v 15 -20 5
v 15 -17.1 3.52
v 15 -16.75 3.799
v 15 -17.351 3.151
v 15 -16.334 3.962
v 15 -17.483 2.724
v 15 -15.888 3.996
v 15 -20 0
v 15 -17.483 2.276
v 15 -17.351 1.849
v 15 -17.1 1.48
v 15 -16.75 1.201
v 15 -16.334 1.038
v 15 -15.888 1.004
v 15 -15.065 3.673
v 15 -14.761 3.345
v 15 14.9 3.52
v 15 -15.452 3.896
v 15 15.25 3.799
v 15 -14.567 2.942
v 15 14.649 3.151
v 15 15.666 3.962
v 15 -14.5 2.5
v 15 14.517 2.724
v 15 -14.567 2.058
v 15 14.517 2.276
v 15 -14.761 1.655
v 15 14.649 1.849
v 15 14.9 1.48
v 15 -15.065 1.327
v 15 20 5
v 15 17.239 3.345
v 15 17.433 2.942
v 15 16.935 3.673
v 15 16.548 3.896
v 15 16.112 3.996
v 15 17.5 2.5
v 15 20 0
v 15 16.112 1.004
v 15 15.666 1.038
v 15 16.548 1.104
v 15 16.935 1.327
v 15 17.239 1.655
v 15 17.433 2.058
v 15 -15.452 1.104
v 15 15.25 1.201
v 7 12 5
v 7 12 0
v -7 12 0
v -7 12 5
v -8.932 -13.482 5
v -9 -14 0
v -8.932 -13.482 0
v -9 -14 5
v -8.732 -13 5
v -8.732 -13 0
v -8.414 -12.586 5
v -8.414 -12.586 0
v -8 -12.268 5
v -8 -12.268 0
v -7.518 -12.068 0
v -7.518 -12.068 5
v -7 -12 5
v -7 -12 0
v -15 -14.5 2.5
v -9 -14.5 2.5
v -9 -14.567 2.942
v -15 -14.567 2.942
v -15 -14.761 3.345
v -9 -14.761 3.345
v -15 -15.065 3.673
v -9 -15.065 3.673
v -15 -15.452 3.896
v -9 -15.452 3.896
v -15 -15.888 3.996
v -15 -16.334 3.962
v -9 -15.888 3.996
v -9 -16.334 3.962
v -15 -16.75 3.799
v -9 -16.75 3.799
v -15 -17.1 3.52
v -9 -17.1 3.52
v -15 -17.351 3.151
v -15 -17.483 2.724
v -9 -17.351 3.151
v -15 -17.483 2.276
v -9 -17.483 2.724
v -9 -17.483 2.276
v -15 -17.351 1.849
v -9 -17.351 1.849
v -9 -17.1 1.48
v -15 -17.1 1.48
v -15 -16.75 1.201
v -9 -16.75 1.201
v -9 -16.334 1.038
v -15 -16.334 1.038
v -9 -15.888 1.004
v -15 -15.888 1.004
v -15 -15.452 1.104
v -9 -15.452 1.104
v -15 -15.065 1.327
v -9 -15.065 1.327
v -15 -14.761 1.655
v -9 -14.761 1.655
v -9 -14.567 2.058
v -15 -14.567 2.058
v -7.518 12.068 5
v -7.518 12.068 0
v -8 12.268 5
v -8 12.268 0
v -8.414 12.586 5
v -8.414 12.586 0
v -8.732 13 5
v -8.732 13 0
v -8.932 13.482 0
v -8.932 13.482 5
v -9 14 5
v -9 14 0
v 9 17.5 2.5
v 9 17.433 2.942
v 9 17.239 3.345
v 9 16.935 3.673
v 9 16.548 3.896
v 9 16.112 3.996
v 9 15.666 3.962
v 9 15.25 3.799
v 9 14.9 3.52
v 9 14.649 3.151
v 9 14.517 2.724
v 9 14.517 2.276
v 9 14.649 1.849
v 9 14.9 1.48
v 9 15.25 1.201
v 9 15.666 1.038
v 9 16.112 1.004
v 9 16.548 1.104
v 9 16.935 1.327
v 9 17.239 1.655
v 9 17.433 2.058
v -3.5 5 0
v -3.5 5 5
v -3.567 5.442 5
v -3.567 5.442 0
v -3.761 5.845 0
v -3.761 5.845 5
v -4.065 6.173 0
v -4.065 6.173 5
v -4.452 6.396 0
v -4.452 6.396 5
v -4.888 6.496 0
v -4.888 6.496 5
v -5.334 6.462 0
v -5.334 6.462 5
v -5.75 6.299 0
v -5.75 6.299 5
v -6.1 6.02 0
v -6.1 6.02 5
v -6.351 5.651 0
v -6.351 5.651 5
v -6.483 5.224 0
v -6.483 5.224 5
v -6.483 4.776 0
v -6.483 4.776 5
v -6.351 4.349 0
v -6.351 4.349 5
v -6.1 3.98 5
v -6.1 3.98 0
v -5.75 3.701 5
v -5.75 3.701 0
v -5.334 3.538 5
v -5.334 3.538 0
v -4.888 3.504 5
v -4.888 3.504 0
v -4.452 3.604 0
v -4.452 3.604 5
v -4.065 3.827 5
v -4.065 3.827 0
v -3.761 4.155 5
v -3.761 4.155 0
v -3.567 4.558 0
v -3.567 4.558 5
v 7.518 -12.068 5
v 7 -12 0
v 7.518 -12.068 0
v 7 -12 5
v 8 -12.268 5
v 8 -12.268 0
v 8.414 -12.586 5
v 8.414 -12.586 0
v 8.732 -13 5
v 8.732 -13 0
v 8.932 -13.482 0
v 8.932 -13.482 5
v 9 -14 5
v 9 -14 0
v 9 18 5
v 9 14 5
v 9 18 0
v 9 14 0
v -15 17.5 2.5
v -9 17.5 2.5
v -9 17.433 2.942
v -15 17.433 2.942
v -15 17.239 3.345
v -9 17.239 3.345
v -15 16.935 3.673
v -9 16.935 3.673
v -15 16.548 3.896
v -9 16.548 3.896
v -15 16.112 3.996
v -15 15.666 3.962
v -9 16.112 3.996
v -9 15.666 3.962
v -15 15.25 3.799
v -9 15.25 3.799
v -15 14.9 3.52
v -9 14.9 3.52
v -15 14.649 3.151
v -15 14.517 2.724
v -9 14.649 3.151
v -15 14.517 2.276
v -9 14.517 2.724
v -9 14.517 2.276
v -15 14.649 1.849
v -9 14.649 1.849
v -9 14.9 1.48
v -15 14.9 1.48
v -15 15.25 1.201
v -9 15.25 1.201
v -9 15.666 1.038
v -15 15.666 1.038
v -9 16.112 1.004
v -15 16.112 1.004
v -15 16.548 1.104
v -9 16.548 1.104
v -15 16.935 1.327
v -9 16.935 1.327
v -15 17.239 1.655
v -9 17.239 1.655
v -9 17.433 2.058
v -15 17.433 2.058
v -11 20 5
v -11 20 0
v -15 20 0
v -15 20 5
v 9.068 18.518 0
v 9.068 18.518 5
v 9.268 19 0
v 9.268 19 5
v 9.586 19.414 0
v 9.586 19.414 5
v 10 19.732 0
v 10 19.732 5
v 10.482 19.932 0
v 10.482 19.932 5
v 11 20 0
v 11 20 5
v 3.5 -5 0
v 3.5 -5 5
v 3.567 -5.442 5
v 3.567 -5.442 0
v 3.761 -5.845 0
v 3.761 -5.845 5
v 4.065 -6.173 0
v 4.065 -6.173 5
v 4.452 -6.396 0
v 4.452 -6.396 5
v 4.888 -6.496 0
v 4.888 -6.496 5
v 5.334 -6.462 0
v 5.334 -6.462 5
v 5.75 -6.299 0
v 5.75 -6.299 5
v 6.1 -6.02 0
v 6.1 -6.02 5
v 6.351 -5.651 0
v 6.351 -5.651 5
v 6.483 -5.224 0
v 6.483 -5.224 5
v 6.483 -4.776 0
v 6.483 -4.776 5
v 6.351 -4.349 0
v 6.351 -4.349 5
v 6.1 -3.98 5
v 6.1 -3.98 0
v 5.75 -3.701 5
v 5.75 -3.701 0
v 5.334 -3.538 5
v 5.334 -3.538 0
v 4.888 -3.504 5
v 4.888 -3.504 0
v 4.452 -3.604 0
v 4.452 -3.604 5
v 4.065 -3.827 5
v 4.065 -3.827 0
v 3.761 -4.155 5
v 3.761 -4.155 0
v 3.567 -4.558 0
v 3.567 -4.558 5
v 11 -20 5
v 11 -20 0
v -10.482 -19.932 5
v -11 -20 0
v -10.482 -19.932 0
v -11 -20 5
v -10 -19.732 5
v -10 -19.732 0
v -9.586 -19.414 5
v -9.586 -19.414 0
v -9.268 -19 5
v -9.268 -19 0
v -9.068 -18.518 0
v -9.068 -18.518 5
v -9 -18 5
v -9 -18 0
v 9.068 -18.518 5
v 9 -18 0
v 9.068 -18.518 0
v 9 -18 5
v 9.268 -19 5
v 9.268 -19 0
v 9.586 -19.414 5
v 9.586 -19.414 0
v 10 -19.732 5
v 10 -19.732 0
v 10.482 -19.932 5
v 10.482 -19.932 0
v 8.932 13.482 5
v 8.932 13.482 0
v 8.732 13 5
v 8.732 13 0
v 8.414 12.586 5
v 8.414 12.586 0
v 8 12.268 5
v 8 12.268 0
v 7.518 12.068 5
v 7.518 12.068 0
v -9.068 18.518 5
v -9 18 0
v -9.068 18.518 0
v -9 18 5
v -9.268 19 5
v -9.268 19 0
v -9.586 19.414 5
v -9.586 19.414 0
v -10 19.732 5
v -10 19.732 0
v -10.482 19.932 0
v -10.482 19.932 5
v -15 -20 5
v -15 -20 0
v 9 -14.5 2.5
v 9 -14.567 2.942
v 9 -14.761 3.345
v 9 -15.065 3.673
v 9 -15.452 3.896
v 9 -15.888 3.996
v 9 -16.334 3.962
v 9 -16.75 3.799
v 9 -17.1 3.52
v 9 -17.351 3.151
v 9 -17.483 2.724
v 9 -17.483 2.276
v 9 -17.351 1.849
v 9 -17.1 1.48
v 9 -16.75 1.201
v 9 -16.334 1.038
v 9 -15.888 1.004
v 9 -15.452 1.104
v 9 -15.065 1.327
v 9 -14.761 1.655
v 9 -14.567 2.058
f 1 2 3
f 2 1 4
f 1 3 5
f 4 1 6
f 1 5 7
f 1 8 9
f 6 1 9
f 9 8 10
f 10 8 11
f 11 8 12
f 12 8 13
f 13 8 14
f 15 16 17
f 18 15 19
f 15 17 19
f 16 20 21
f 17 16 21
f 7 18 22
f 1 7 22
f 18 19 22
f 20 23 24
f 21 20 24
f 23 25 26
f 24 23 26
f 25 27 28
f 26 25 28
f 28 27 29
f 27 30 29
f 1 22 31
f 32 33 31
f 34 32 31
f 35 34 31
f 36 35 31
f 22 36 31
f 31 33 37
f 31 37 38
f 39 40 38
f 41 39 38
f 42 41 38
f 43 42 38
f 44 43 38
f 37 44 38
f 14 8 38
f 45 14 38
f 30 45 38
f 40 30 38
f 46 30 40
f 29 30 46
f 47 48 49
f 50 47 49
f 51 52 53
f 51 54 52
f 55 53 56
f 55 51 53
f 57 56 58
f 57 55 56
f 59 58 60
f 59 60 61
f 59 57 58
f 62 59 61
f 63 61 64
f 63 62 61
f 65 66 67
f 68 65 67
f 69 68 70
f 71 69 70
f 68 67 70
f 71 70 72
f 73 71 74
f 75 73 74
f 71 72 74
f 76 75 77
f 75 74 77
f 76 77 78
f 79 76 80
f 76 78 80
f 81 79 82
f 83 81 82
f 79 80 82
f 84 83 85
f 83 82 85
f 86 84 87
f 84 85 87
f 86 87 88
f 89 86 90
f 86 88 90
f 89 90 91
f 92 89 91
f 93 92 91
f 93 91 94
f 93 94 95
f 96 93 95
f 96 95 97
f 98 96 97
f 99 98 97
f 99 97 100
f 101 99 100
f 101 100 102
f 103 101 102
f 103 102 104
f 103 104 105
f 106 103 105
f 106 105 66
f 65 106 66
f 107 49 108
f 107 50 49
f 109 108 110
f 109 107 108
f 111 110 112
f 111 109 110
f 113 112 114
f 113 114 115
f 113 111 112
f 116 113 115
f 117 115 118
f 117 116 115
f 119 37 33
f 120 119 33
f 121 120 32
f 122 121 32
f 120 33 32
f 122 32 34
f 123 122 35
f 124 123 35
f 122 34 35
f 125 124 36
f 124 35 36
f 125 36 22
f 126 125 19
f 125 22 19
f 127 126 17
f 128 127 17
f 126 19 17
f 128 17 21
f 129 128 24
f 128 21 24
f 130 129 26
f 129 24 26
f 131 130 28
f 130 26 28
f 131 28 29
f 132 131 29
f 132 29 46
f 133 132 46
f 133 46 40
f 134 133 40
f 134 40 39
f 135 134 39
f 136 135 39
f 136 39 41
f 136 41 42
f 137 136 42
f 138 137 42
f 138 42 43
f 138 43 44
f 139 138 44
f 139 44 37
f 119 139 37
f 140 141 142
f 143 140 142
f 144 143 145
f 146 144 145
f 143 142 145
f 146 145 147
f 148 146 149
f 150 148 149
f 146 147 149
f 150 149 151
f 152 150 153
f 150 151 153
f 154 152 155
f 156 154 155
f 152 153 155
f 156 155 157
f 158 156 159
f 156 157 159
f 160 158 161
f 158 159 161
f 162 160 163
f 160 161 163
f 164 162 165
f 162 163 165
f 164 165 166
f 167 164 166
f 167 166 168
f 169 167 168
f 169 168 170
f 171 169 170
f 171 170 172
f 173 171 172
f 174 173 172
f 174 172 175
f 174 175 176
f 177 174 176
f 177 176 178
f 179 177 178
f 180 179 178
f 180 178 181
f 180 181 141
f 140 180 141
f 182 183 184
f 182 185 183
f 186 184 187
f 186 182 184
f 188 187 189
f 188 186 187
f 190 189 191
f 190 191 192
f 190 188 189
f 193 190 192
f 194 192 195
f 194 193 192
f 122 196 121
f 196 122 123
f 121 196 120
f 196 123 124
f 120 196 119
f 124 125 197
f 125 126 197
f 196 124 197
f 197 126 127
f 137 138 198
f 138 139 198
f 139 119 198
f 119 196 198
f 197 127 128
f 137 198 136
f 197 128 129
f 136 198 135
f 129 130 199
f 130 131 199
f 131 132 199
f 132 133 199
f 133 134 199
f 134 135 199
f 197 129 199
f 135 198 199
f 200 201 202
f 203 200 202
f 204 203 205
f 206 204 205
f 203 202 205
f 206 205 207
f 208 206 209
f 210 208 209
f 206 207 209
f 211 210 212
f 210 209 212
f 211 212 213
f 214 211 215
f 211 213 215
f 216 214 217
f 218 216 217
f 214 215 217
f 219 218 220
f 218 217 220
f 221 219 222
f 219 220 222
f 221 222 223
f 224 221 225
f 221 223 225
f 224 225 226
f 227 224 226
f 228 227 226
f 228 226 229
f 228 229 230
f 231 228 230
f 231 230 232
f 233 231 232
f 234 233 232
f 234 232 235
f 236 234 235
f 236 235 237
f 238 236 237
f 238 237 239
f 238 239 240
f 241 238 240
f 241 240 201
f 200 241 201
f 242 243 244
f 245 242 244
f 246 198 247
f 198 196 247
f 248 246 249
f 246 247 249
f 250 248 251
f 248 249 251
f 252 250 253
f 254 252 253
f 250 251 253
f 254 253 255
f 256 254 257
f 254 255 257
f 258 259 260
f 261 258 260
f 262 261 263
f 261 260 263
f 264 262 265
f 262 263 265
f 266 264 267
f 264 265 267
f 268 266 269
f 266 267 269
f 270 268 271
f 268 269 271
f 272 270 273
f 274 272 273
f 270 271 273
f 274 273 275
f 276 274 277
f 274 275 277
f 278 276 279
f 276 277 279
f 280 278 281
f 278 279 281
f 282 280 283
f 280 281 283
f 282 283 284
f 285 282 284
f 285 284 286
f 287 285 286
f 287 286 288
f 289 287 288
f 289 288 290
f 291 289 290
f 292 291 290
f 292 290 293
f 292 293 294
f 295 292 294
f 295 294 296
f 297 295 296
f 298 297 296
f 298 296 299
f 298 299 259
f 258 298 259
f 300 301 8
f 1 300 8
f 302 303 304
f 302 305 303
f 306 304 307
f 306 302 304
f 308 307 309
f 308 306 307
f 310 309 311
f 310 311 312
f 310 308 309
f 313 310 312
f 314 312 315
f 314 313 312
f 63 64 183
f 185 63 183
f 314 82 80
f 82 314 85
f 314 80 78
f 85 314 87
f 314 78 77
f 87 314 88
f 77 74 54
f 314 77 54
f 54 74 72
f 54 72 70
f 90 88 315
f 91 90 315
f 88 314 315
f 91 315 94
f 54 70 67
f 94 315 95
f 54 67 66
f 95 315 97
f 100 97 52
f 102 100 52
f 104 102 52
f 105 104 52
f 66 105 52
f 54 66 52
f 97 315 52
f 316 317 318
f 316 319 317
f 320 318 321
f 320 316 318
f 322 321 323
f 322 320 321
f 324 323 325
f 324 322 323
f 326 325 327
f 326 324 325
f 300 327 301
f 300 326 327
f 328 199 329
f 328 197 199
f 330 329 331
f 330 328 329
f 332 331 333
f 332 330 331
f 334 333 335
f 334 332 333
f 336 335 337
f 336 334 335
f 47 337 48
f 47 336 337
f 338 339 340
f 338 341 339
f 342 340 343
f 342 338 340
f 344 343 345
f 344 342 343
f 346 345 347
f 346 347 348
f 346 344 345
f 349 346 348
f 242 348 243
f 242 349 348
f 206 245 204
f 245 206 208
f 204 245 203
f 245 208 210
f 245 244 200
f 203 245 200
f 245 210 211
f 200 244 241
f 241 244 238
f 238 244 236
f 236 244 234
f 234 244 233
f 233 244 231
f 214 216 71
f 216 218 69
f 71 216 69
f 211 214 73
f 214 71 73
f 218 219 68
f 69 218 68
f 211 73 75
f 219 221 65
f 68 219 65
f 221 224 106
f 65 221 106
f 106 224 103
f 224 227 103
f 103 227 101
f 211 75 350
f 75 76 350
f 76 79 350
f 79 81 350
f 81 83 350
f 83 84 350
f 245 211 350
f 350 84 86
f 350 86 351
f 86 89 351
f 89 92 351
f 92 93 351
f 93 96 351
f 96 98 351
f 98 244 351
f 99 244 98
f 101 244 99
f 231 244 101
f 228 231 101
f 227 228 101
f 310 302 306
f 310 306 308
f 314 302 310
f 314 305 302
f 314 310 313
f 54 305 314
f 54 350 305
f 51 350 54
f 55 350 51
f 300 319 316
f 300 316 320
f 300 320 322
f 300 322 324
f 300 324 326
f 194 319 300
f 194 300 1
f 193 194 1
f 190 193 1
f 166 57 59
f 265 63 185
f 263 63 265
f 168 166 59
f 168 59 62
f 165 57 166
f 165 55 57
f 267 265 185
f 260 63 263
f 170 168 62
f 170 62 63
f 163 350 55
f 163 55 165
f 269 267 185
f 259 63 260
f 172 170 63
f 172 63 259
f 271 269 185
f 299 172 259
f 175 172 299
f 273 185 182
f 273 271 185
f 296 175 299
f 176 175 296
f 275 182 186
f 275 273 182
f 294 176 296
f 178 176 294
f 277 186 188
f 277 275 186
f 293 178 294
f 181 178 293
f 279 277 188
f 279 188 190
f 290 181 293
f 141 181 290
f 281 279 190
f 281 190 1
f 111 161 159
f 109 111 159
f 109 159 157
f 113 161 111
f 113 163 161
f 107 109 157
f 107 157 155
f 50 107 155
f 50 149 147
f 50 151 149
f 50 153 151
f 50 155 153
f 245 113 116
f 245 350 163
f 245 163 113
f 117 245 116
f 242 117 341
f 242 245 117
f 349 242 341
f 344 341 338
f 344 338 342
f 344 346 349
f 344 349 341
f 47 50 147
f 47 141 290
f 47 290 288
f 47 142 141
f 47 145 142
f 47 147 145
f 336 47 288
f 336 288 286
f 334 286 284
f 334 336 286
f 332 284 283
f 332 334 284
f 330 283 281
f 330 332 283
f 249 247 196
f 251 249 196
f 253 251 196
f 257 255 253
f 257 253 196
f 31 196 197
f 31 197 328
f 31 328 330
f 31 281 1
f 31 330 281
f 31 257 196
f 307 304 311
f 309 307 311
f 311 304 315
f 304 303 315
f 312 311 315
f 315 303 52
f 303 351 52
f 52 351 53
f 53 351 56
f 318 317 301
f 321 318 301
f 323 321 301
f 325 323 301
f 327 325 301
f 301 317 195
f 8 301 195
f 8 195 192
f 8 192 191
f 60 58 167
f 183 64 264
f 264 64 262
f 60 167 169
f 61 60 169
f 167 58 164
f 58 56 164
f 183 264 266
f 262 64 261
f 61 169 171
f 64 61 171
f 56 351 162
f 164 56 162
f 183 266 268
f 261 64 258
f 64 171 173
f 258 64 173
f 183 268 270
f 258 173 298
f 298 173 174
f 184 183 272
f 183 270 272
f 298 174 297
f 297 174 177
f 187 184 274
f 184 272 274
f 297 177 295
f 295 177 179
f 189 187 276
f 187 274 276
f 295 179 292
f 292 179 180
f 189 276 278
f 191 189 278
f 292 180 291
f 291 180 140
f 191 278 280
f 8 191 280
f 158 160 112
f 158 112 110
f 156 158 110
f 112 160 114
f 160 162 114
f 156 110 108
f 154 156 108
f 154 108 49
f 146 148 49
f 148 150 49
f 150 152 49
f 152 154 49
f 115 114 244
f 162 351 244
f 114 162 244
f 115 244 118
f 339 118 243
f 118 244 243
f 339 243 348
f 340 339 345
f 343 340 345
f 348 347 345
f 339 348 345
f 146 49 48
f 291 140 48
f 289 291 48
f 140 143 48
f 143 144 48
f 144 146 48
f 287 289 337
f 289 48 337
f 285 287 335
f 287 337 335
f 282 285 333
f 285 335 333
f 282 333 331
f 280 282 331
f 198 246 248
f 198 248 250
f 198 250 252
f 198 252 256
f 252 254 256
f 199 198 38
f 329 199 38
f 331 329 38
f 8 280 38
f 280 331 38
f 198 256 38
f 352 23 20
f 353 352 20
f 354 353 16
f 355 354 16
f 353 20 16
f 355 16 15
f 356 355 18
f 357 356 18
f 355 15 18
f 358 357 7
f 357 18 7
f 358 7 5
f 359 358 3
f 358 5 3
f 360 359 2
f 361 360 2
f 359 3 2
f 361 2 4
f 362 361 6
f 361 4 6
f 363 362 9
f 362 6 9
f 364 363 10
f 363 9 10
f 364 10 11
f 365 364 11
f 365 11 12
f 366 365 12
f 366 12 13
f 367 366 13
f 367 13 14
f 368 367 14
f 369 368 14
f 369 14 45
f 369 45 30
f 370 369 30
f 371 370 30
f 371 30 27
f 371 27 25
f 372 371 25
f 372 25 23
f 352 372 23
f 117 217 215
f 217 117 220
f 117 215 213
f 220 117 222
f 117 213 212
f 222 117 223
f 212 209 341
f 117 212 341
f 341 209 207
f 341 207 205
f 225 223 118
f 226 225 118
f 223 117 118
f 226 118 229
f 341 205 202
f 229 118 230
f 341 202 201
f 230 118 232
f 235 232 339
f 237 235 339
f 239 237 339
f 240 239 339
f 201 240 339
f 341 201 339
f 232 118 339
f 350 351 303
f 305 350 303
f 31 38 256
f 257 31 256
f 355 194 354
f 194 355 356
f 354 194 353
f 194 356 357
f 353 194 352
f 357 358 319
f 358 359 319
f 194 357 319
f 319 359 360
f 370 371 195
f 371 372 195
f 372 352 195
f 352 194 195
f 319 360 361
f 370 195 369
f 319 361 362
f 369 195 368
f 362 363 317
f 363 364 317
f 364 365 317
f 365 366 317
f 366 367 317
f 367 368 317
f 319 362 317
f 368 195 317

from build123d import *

# Parameters (mm, degrees)
EXTRUDE_1_DEPTH     = 5
FILLET_1_R          = 2
SKETCH_2_R          = 1.5
CUT_EXTRUDE_1_DEPTH = 26.495097568
SKETCH_6_R          = 1.5
CUT_EXTRUDE_2_DEPTH = 37.400549446


with BuildPart() as part:
    # 草图1 → 凸台-拉伸1 (new body)
    with BuildSketch(Plane.XY):
        Polygon((9, 20), (9, 12), (-9, 12), (-9, 20), (-15, 20), (-15, -20), (-9, -20), (-9, -12), (9, -12), (9, -20), (15, -20), (15, 20), align=None)
    extrude(amount=EXTRUDE_1_DEPTH)

    # 圆角1
    fillet_1_edges = [part.edges().sort_by_distance(p)[0] for p in [
        (9, -20, 2.5),
        (9, -12, 2.5),
        (-9, -12, 2.5),
        (-9, -20, 2.5),
        (-9, 20, 2.5),
        (-9, 12, 2.5),
        (9, 12, 2.5),
        (9, 20, 2.5),
    ]]
    fillet(fillet_1_edges, radius=FILLET_1_R)

    # 草图2 → 切除-拉伸1 (cut, through all)
    with BuildSketch(Plane.XY.offset(5)):
        with Locations((-5, 5)):
            Circle(SKETCH_2_R)
        with Locations(Location((5, -5, 0), (0, 0, 180))):
            Circle(SKETCH_2_R)
    extrude(amount=-CUT_EXTRUDE_1_DEPTH, mode=Mode.SUBTRACT)

    # 草图6 → 切除-拉伸2 (cut, through all)
    with BuildSketch(Plane(origin=(15, 0, 0), x_dir=(0, 0, -1), z_dir=(1, 0, 0))):
        with Locations(Location((-2.5, 16, 0), (0, 0, 90))):
            Circle(SKETCH_6_R)
        with Locations(Location((-2.5, -16, 0), (0, 0, 90))):
            Circle(SKETCH_6_R)
    extrude(amount=-CUT_EXTRUDE_2_DEPTH, mode=Mode.SUBTRACT)


solid = part.part
